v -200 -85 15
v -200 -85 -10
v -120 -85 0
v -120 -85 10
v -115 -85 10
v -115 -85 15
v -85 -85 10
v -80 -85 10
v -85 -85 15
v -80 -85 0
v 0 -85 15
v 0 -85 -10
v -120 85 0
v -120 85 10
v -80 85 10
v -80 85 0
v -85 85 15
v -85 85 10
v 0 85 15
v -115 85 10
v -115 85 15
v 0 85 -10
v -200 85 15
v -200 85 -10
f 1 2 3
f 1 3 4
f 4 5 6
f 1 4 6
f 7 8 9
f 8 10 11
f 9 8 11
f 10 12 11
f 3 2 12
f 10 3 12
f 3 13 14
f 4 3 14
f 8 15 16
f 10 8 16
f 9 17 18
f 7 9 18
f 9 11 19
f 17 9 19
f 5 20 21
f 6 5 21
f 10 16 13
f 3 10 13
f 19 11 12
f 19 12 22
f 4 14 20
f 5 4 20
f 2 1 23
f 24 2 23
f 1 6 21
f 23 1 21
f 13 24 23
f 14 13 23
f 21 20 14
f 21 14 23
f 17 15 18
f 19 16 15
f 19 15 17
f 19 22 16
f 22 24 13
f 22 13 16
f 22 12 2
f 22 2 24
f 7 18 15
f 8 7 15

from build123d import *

# Parameters (mm, degrees)
F0_W     = 170
F0_H     = 25
F1_DEPTH = 200
F3_DEPTH = 170.001


with BuildPart() as f1:
    # F0 (on Right) → F1 (new body)
    with BuildSketch(Plane.YZ):
        with Locations((0, 2.5)):
            Rectangle(F0_W, F0_H)
    extrude(amount=-F1_DEPTH)

    # F2 (on face) → F3 (cut, through all)
    with BuildSketch(Plane(origin=(0, 85, 0), x_dir=(-1, 0, 0), z_dir=(0, 1, 0))):
        Polygon((115, 10), (115, 15), (100, 15), (85, 15), (85, 10), (80, 10), (80, 0), (100, 0), (120, 0), (120, 10), align=None)
    extrude(amount=-F3_DEPTH, mode=Mode.SUBTRACT)


solid = f1.part
